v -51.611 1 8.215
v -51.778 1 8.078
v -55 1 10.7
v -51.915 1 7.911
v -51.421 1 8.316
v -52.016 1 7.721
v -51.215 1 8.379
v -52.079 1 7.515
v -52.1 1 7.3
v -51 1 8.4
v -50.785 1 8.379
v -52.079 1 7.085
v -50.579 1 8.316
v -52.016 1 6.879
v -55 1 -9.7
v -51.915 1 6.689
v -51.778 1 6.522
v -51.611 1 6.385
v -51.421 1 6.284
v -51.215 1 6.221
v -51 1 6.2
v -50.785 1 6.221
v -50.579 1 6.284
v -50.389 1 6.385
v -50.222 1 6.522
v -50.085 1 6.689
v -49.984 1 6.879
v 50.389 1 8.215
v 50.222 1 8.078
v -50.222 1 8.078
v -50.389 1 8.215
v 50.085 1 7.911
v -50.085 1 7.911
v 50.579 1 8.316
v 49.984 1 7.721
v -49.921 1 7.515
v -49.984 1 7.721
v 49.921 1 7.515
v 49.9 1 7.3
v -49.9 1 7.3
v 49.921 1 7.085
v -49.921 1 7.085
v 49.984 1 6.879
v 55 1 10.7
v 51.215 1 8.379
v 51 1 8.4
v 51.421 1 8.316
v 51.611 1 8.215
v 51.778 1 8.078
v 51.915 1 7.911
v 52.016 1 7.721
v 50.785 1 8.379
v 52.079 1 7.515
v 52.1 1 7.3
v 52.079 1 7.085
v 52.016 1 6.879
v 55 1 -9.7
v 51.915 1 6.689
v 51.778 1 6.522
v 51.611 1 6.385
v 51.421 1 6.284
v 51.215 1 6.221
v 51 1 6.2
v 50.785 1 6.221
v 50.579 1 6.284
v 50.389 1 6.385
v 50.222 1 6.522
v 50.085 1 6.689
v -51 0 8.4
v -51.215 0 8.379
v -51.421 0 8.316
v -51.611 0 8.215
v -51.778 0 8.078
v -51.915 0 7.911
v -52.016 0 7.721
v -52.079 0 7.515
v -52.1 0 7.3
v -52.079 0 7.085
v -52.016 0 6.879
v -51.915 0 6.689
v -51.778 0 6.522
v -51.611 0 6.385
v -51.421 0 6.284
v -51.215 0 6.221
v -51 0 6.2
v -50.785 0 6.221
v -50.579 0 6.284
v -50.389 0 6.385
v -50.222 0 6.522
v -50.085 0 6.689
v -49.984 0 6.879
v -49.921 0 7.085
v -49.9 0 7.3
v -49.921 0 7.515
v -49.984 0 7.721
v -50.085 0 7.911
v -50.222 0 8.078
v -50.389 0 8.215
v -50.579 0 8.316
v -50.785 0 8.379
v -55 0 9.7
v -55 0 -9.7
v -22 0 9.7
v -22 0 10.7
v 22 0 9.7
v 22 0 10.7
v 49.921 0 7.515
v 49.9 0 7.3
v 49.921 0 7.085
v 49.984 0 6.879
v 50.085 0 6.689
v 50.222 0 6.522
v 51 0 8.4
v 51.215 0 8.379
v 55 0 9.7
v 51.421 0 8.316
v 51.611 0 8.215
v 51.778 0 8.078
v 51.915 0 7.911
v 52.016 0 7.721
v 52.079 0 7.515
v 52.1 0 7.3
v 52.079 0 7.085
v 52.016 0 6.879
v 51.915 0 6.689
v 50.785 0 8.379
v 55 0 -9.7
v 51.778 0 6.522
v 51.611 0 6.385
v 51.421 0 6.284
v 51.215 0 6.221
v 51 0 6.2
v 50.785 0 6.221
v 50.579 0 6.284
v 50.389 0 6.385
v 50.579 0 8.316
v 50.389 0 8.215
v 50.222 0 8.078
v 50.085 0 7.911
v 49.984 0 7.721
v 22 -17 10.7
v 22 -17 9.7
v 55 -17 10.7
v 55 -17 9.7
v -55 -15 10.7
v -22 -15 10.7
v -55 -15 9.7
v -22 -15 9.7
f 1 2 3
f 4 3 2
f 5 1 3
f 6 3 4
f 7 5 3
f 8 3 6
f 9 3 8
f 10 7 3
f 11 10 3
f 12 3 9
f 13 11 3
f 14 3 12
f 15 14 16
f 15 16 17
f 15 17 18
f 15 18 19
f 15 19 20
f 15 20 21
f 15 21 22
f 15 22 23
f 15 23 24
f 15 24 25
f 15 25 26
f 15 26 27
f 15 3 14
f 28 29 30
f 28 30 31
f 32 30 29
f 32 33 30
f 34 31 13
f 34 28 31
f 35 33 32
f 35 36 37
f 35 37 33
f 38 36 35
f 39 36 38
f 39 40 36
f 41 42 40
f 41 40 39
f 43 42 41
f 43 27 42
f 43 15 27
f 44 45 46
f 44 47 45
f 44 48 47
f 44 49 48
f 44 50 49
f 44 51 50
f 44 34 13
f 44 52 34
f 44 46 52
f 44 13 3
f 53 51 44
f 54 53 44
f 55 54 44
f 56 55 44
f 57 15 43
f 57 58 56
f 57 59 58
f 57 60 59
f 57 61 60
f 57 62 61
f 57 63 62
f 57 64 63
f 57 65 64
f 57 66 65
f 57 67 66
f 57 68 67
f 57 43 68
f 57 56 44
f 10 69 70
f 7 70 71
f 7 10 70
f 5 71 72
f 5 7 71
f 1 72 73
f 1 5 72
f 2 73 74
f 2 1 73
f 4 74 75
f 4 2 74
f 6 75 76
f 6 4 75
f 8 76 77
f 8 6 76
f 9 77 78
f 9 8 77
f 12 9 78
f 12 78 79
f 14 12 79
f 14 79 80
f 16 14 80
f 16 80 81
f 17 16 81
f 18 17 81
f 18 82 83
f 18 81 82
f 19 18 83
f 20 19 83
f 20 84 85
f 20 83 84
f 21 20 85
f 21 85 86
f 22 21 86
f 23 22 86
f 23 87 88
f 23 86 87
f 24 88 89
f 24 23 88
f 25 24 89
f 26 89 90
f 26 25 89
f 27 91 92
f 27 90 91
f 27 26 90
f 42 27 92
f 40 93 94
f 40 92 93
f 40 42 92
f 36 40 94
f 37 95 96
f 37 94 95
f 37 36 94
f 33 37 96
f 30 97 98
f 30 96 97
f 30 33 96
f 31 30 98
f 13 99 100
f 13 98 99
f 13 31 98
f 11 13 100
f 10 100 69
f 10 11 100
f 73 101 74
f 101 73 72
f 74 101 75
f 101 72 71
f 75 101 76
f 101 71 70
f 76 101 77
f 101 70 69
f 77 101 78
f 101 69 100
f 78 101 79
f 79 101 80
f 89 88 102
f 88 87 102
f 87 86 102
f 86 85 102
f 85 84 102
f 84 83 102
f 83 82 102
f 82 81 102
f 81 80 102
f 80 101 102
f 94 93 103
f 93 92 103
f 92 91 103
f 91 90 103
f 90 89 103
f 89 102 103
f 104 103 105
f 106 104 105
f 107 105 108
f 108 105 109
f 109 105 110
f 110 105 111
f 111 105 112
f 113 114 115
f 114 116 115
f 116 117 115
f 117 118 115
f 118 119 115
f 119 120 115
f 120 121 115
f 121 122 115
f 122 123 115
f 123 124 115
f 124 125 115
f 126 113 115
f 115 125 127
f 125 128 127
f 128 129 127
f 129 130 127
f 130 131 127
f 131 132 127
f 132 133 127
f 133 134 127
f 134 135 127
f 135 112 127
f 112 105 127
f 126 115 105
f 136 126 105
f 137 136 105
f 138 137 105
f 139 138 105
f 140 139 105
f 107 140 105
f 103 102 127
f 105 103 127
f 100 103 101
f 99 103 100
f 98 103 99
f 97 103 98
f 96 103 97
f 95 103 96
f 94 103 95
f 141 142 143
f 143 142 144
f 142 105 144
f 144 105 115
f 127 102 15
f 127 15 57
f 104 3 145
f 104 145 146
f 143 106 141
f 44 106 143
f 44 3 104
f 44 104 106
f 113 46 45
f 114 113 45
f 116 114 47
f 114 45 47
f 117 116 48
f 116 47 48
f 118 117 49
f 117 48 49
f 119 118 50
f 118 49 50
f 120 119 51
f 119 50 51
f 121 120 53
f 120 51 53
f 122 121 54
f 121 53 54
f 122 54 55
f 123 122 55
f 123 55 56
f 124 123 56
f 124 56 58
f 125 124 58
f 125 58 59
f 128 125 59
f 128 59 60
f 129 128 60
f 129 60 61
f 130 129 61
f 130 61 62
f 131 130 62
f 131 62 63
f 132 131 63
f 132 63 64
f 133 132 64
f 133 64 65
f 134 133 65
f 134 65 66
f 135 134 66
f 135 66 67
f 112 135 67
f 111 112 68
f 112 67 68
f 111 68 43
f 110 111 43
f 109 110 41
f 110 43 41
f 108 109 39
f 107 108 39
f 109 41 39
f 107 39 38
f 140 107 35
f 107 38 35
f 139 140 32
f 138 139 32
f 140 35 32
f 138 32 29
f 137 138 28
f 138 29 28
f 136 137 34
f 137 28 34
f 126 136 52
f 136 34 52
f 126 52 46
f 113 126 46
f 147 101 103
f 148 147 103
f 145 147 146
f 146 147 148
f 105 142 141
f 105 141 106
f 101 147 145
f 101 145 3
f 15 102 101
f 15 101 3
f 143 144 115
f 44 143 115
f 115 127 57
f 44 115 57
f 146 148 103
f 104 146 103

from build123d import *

# Parameters (mm, degrees)
SKETCH_1_W          = 110
SKETCH_1_H          = 19.4
EXTRUDE_1_DEPTH     = 1
SKETCH_2_W          = 33
SKETCH_2_H          = 18
EXTRUDE_2_DEPTH     = 1
SKETCH_3_W          = 33
SKETCH_3_H          = 16
EXTRUDE_3_DEPTH     = 1
SKETCH_5_W          = 44
SKETCH_5_H          = 1
EXTRUDE_5_DEPTH     = 1
SKETCH_6_R          = 1.1
CUT_EXTRUDE_1_DEPTH = 10


with BuildPart() as part:
    # 草图1 → 凸台-拉伸1 (new body)
    with BuildSketch(Plane(origin=(0, 0, 0), x_dir=(1, 0, 0), z_dir=(0, 1, 0))):
        Rectangle(SKETCH_1_W, SKETCH_1_H)
    extrude(amount=EXTRUDE_1_DEPTH)

    # 草图2 → 凸台-拉伸2 (add)
    with BuildSketch(Plane.XY.offset(9.7)):
        with Locations((38.5, -8)):
            Rectangle(SKETCH_2_W, SKETCH_2_H)
    extrude(amount=EXTRUDE_2_DEPTH)

    # 草图3 → 凸台-拉伸3 (add)
    with BuildSketch(Plane.XY.offset(9.7)):
        with Locations((-38.5, -7)):
            Rectangle(SKETCH_3_W, SKETCH_3_H)
    extrude(amount=EXTRUDE_3_DEPTH)

    # 草图5 → 凸台-拉伸5 (add)
    with BuildSketch(Plane(origin=(0, 1, 0), x_dir=(1, 0, 0), z_dir=(0, 1, 0))):
        with Locations((0, -10.2)):
            Rectangle(SKETCH_5_W, SKETCH_5_H)
    extrude(amount=-EXTRUDE_5_DEPTH)

    # 草图6 → 切除-拉伸1 (cut)
    with BuildSketch(Plane(origin=(0, 1, 0), x_dir=(1, 0, 0), z_dir=(0, 1, 0))):
        with Locations(Location((51, -7.3, 0), (0, 0, 270))):
            Circle(SKETCH_6_R)
    cut_extrude_1 = extrude(amount=-CUT_EXTRUDE_1_DEPTH, mode=Mode.SUBTRACT)

    # 镜向1: 切除-拉伸1 across plane
    add(cut_extrude_1.mirror(Plane(origin=(0, 0, 0), x_dir=(0, 0, 1), z_dir=(1, 0, 0))), mode=Mode.SUBTRACT)


solid = part.part
